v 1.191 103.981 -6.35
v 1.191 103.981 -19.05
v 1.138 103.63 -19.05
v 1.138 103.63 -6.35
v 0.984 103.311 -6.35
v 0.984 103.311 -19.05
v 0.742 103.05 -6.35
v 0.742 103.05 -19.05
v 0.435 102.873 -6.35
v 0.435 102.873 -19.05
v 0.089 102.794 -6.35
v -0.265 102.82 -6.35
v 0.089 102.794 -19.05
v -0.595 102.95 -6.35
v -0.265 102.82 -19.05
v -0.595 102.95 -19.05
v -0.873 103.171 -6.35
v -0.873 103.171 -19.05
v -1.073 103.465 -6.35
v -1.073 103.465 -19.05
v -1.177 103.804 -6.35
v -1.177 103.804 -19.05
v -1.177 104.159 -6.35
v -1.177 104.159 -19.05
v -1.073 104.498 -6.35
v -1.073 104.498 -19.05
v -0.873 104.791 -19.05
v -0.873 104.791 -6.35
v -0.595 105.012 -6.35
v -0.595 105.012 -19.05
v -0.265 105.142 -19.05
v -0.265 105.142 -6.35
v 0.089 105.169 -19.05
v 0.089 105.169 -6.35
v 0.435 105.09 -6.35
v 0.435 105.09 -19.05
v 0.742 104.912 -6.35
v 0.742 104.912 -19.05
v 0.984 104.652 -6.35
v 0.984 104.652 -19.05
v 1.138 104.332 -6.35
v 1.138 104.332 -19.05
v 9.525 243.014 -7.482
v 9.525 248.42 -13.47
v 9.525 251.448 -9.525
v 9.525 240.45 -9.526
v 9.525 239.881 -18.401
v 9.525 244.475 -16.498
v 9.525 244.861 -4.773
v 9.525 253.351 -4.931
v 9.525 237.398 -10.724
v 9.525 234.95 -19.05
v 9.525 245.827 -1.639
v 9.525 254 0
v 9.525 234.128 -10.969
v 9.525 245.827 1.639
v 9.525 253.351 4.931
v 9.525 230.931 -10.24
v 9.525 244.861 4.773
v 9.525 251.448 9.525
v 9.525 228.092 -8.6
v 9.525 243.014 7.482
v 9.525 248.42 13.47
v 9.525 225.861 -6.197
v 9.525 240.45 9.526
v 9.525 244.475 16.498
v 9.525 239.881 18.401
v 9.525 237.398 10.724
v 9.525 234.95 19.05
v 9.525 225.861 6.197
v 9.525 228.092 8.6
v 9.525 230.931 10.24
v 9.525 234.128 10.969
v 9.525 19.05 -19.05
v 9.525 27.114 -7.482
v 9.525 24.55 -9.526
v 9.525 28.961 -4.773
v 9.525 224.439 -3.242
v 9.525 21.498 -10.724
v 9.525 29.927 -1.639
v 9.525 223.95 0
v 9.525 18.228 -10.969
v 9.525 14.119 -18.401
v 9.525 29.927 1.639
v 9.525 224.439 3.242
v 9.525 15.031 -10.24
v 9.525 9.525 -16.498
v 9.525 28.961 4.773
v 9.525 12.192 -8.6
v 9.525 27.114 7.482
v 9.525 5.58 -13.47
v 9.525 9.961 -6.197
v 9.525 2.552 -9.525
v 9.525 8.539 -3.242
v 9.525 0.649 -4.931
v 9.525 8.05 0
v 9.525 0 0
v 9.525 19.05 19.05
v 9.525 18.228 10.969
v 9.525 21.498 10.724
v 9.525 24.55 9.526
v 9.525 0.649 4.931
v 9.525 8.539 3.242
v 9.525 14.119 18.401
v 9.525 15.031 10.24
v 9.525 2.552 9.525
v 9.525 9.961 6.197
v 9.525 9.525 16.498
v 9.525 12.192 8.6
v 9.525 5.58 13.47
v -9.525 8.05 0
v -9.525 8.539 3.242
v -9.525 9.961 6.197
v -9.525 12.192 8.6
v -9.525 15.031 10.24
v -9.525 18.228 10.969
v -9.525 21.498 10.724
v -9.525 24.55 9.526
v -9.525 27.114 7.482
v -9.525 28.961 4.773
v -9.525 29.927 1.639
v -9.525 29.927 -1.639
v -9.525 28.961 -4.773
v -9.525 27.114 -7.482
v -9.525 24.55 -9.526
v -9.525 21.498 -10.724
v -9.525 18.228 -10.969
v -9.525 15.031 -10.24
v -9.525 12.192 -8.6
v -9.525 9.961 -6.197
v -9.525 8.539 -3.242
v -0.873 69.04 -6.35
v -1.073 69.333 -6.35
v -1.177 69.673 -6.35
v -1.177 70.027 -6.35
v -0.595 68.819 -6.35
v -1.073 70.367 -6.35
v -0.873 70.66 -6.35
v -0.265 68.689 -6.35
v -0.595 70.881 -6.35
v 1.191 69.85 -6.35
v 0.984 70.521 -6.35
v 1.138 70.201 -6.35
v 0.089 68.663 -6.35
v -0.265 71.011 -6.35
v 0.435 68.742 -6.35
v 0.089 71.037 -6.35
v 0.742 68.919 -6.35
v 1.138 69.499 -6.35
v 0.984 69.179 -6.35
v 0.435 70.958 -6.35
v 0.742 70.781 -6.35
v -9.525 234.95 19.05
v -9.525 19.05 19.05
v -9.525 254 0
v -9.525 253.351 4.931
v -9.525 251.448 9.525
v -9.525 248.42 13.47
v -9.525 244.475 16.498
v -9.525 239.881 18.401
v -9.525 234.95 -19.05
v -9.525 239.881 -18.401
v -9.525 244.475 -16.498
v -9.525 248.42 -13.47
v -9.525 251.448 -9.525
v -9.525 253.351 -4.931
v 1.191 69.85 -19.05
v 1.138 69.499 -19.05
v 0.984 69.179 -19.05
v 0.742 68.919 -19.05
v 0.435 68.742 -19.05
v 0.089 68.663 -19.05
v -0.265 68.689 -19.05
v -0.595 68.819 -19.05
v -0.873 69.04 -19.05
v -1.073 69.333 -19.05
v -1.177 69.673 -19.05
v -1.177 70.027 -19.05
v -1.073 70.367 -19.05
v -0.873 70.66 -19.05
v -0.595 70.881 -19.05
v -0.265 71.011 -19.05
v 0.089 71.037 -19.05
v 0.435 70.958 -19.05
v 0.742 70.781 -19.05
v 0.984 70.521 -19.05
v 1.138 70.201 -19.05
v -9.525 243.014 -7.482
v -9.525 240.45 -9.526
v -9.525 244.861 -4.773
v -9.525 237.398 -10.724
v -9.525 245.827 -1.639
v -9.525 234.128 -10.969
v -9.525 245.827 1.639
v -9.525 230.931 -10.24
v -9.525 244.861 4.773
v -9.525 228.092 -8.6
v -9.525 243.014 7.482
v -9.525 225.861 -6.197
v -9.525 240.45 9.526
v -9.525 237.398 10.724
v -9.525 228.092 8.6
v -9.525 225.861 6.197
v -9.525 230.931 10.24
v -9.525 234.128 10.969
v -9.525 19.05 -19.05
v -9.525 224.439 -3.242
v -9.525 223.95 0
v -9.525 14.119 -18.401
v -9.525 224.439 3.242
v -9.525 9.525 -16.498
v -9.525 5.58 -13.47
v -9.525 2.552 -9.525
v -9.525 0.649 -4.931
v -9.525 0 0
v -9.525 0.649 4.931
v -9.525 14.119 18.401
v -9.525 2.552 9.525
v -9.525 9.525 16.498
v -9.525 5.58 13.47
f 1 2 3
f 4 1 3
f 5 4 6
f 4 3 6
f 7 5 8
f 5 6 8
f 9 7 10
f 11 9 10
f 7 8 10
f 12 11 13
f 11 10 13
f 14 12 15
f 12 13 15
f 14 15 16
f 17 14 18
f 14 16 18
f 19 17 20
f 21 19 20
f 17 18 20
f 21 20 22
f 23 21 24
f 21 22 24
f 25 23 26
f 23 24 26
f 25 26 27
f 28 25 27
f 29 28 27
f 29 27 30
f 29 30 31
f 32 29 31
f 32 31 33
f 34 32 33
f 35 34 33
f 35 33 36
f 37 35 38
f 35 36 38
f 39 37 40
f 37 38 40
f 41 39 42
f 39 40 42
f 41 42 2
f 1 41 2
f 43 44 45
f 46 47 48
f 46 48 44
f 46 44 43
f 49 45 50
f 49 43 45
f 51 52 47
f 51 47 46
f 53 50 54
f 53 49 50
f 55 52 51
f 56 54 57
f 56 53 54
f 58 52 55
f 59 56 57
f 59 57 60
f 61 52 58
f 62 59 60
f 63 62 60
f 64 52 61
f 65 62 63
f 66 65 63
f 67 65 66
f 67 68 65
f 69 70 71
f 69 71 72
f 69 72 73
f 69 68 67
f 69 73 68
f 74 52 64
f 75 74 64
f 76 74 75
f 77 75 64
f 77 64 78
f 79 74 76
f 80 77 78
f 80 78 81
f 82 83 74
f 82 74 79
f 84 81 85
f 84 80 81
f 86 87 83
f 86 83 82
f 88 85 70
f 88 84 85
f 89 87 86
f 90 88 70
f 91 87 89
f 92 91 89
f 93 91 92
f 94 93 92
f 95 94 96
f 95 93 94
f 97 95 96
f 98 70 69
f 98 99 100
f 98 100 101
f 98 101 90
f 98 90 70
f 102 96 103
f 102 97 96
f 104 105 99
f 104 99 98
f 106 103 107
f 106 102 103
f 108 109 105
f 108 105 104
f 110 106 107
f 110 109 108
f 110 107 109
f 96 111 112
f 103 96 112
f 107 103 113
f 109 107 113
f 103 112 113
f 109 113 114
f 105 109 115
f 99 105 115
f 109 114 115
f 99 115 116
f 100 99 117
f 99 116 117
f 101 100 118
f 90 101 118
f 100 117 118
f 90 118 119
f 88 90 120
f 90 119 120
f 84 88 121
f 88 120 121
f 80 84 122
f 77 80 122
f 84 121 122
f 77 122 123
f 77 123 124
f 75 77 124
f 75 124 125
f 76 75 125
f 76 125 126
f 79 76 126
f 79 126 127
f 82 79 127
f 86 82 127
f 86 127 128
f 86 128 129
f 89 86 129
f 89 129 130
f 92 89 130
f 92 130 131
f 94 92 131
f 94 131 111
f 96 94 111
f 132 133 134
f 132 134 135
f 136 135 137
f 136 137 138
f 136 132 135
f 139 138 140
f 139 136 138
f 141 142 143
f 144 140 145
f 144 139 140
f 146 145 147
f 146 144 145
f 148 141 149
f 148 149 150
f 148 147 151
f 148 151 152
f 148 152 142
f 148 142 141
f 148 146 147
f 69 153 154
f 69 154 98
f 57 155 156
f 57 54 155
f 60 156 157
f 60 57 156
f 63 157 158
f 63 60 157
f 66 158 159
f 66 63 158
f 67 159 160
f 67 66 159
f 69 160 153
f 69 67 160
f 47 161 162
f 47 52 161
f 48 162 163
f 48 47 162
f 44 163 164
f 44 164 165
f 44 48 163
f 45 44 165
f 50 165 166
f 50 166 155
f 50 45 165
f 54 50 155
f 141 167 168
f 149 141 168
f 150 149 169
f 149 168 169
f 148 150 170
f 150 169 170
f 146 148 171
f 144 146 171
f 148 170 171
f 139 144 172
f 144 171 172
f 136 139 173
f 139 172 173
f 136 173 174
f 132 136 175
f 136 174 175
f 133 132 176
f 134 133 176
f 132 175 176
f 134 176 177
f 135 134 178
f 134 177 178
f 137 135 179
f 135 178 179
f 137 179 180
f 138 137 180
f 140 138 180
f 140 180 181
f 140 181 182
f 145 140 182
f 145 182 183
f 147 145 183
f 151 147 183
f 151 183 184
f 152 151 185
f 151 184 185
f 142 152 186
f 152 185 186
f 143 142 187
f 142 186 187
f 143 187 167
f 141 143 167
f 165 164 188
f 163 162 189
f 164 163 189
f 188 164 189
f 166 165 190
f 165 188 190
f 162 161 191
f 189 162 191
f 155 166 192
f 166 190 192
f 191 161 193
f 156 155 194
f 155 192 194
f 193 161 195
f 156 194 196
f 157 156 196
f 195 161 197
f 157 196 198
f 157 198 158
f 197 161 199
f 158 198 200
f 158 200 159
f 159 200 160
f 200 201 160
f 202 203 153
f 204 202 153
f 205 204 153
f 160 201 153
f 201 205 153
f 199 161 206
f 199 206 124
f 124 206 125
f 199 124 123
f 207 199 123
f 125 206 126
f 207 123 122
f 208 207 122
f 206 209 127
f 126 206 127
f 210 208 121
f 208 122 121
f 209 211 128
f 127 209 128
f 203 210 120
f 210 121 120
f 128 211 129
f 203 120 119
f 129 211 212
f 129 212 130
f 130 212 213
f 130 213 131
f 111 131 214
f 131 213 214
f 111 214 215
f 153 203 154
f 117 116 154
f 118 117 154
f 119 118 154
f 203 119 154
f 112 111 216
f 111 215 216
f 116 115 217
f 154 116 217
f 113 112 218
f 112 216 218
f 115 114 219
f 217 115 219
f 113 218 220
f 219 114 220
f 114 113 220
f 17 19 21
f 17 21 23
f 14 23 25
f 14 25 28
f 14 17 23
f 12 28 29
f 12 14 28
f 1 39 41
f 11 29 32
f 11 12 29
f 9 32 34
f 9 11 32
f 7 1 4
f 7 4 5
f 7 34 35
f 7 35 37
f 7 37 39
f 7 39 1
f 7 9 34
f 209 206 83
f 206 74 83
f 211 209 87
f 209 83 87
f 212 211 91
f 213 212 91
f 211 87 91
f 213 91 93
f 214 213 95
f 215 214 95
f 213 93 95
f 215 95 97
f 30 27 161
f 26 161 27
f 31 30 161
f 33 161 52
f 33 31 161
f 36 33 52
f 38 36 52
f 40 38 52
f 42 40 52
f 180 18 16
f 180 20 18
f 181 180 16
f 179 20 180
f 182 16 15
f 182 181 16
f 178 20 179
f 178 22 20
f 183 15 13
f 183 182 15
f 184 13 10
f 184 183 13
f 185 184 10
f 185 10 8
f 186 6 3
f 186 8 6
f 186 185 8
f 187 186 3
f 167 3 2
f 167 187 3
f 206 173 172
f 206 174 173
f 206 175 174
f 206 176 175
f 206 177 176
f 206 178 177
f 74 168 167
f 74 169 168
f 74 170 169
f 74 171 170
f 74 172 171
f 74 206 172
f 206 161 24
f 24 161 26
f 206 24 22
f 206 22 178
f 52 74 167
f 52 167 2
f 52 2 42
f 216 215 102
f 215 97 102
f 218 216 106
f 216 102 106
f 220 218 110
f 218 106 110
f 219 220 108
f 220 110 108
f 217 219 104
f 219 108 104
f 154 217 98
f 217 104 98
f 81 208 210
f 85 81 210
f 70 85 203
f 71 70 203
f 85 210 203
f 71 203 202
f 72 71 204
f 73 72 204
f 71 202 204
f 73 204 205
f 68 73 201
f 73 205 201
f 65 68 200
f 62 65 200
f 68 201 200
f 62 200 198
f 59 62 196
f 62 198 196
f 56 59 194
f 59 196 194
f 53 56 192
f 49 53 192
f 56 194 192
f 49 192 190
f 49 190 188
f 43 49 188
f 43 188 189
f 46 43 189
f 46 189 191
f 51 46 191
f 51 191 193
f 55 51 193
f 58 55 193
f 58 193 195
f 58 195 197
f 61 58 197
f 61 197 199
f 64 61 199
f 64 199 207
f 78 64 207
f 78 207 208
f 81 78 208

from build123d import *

# Parameters (mm, degrees)
F0_W     = 19.05
F0_H     = 38.1
F1_DEPTH = 254
F3_D     = 22
F4_R     = 19.04999
F5_R     = 1.190625
F6_DEPTH = 12.7


# Not quite as in the source:
# - a fillet or chamfer is up to 0.001 mm smaller than in the source, because OpenCascade refuses the exact size


with BuildPart() as f1:
    # F0 (on Front) → F1 (new body)
    with BuildSketch(Plane.XZ):
        Rectangle(F0_W, F0_H)
    extrude(amount=-F1_DEPTH)

    # F3 (through all)
    with Locations(Plane.YZ.offset(9.525)):
        with Locations((19.05, 0), (234.95, 0)):
            Hole(F3_D / 2)

    # F4 (radius 19.05 in the source; OpenCascade refuses exactly that, so slightly less here)
    f4_edges = [f1.edges().sort_by_distance(p)[0] for p in [
        (0, 0, 19.05),
        (0, 0, -19.05),
        (0, 254, 19.05),
        (0, 254, -19.05),
    ]]
    fillet(f4_edges, radius=F4_R)

    # F5 (on face) → F6 (cut)
    with BuildSketch(Plane(origin=(0, 0, -19.05), x_dir=(1, 0, 0), z_dir=(0, 0, -1))):
        with Locations((0, -103.98125)):
            Circle(F5_R)
        with Locations((0, -69.85)):
            Circle(F5_R)
    extrude(amount=-F6_DEPTH, mode=Mode.SUBTRACT)


solid = f1.part
